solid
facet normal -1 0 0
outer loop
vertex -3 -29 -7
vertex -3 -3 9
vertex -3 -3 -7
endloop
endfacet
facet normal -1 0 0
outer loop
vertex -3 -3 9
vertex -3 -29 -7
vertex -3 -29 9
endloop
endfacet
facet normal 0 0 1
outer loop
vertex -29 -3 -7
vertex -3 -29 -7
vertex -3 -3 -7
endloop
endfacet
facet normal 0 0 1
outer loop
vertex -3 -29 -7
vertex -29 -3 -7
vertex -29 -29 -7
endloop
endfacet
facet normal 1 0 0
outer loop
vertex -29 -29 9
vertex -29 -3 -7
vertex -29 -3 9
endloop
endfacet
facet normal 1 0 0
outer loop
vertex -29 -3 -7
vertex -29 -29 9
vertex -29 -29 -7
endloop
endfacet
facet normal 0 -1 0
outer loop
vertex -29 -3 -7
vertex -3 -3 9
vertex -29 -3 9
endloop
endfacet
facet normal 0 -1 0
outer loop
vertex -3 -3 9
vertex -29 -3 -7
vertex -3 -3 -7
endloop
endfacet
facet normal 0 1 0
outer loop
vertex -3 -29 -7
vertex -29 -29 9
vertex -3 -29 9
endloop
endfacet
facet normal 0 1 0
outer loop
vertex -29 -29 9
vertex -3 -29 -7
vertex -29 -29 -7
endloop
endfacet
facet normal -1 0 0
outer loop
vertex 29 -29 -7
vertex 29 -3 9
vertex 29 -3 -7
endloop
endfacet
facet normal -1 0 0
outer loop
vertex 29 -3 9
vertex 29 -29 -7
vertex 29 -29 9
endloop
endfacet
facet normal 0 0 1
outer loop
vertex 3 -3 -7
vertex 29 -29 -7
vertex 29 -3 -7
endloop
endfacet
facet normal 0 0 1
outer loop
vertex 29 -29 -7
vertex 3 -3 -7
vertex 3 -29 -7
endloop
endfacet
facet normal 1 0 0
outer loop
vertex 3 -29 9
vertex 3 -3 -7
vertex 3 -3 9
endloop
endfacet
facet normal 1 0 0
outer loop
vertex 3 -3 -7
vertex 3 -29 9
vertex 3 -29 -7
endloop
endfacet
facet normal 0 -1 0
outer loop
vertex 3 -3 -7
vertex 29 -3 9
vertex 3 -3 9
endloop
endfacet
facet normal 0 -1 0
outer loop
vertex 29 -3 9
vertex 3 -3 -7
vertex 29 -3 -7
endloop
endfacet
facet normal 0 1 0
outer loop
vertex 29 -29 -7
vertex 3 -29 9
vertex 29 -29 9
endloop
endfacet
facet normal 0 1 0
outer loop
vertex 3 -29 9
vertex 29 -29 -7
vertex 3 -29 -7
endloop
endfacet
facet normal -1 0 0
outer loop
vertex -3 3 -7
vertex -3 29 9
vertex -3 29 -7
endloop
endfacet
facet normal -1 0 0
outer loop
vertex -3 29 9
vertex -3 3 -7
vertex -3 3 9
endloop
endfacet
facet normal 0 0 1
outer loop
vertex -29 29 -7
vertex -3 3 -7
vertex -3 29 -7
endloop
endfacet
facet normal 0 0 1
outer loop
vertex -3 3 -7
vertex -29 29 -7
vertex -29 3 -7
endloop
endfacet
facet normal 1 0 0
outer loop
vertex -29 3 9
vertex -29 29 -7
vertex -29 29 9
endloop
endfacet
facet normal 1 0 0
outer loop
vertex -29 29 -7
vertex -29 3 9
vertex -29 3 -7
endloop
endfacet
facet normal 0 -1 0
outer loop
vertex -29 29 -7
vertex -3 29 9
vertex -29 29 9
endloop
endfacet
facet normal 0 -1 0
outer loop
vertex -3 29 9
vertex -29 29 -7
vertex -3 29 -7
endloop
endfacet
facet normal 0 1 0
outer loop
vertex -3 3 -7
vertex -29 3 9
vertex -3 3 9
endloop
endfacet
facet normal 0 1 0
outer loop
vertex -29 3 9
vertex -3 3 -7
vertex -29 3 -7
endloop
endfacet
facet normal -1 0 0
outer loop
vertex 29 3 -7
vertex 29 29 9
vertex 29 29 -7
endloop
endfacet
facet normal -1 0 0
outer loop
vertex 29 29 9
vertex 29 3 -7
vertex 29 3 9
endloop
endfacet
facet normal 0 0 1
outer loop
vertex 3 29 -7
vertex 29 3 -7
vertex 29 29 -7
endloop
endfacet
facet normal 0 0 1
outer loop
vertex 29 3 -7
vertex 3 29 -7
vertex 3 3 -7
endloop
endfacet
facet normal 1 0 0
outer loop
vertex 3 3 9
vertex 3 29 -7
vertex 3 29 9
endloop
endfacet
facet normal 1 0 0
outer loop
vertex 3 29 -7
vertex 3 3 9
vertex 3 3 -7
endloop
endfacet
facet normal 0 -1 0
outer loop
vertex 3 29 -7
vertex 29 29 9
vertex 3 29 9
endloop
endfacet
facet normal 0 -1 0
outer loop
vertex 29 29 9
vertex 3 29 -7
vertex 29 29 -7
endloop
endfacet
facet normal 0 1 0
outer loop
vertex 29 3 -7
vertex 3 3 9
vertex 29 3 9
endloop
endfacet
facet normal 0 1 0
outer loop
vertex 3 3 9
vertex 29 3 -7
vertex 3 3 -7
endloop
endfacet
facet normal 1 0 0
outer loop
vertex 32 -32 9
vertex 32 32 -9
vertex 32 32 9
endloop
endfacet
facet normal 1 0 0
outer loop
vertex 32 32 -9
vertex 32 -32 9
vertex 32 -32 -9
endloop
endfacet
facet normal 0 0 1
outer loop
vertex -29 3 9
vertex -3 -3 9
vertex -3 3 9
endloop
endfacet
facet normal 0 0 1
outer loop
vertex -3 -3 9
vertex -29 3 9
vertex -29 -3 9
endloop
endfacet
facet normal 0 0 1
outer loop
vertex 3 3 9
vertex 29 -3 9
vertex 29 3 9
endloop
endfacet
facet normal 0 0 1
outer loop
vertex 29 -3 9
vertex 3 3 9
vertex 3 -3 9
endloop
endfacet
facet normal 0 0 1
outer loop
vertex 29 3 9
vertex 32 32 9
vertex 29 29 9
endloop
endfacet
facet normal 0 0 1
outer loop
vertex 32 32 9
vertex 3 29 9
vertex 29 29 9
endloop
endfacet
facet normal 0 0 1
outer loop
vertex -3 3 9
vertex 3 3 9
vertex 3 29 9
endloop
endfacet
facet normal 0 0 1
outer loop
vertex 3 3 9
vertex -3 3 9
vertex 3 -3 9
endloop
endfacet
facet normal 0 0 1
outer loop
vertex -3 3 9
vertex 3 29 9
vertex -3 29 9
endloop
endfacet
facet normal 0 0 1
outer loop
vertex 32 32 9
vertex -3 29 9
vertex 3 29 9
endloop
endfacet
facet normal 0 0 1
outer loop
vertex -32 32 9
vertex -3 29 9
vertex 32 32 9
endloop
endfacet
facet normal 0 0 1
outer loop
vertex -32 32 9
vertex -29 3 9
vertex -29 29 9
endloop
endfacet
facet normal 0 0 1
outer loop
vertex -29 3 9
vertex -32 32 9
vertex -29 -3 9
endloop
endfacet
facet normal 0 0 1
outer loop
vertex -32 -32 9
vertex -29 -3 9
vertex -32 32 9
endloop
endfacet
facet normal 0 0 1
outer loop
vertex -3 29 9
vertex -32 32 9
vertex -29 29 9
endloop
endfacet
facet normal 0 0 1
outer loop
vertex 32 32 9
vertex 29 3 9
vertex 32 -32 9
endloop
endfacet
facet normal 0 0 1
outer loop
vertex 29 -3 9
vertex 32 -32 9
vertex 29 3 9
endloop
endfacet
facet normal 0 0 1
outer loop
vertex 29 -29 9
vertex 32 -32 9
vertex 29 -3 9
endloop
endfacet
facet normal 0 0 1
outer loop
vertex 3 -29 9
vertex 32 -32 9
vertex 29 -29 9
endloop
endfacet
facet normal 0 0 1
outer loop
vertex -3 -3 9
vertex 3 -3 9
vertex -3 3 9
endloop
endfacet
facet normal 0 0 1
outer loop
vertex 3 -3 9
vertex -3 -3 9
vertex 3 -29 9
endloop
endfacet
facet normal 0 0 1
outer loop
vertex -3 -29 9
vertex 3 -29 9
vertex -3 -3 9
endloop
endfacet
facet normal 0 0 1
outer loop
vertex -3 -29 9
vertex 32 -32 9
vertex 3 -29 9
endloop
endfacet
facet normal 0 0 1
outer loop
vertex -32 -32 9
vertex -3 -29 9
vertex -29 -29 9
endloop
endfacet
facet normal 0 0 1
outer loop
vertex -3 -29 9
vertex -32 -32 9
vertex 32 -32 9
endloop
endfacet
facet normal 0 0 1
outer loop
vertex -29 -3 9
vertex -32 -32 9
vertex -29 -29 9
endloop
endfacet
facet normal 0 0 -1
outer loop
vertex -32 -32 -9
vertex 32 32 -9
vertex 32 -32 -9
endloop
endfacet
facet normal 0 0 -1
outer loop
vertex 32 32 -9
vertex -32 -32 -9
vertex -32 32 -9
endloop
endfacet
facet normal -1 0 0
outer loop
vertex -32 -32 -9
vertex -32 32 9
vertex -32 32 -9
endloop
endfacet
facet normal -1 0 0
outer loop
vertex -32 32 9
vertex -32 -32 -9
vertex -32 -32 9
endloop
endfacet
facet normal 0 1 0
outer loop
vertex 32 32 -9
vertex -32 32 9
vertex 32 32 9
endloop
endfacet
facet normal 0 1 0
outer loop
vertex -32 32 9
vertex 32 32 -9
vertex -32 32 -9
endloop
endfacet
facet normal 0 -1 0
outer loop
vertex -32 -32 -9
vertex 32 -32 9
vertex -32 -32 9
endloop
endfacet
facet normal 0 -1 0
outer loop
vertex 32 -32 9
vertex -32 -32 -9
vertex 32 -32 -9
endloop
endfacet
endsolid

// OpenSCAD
$fn = 32;

// ----------------------------------------------------------------------
// Pocket plate 64 x 64 x 18
// 2 x 2 pockets 26 mm square, 16 mm deep
// ----------------------------------------------------------------------

// --- parameters (mm) ---
thickness = 18;  // plate thickness
floor_t = 2;     // material left under each pocket
pocket = 26;     // pocket side length
pitch_x = 32;    // pocket pitch along X
pitch_y = 32;    // pocket pitch along Y
cols = 2;        // pockets per row
rows = 2;        // rows of pockets

// --- derived feature positions (mm) ---
depth = thickness - floor_t;        // = 16   pocket depth, down to the floor
span_x = (cols - 1) * pitch_x;      // = 32   distance between outer pockets
span_y = (rows - 1) * pitch_y;      // = 32   distance between outer pocket rows
origin_x = -span_x / 2;             // = -16   X of the first pocket
origin_y = -span_y / 2;             // = -16   Y of the first pocket
plate = [span_x + pocket + 6, span_y + pocket + 6, thickness];  // = [64, 64, 18]   overall size: pockets plus 3 mm of wall on each side
feature_centers = [
  [origin_x + 0 * pitch_x, origin_y + 0 * pitch_y],
  [origin_x + 1 * pitch_x, origin_y + 0 * pitch_y],
  [origin_x + 0 * pitch_x, origin_y + 1 * pitch_y],
  [origin_x + 1 * pitch_x, origin_y + 1 * pitch_y]
];   // pocket centres, used verbatim by the cutter loop

// plate outline, then one pocket per centre in feature_centers
difference() {
  cube(plate, center = true);
  for (centre = feature_centers)
    translate([centre[0] - pocket / 2, centre[1] - pocket / 2, plate[2] / 2 - depth])
      cube([pocket, pocket, depth + 1]);  // centred on the declared pocket centre
}
